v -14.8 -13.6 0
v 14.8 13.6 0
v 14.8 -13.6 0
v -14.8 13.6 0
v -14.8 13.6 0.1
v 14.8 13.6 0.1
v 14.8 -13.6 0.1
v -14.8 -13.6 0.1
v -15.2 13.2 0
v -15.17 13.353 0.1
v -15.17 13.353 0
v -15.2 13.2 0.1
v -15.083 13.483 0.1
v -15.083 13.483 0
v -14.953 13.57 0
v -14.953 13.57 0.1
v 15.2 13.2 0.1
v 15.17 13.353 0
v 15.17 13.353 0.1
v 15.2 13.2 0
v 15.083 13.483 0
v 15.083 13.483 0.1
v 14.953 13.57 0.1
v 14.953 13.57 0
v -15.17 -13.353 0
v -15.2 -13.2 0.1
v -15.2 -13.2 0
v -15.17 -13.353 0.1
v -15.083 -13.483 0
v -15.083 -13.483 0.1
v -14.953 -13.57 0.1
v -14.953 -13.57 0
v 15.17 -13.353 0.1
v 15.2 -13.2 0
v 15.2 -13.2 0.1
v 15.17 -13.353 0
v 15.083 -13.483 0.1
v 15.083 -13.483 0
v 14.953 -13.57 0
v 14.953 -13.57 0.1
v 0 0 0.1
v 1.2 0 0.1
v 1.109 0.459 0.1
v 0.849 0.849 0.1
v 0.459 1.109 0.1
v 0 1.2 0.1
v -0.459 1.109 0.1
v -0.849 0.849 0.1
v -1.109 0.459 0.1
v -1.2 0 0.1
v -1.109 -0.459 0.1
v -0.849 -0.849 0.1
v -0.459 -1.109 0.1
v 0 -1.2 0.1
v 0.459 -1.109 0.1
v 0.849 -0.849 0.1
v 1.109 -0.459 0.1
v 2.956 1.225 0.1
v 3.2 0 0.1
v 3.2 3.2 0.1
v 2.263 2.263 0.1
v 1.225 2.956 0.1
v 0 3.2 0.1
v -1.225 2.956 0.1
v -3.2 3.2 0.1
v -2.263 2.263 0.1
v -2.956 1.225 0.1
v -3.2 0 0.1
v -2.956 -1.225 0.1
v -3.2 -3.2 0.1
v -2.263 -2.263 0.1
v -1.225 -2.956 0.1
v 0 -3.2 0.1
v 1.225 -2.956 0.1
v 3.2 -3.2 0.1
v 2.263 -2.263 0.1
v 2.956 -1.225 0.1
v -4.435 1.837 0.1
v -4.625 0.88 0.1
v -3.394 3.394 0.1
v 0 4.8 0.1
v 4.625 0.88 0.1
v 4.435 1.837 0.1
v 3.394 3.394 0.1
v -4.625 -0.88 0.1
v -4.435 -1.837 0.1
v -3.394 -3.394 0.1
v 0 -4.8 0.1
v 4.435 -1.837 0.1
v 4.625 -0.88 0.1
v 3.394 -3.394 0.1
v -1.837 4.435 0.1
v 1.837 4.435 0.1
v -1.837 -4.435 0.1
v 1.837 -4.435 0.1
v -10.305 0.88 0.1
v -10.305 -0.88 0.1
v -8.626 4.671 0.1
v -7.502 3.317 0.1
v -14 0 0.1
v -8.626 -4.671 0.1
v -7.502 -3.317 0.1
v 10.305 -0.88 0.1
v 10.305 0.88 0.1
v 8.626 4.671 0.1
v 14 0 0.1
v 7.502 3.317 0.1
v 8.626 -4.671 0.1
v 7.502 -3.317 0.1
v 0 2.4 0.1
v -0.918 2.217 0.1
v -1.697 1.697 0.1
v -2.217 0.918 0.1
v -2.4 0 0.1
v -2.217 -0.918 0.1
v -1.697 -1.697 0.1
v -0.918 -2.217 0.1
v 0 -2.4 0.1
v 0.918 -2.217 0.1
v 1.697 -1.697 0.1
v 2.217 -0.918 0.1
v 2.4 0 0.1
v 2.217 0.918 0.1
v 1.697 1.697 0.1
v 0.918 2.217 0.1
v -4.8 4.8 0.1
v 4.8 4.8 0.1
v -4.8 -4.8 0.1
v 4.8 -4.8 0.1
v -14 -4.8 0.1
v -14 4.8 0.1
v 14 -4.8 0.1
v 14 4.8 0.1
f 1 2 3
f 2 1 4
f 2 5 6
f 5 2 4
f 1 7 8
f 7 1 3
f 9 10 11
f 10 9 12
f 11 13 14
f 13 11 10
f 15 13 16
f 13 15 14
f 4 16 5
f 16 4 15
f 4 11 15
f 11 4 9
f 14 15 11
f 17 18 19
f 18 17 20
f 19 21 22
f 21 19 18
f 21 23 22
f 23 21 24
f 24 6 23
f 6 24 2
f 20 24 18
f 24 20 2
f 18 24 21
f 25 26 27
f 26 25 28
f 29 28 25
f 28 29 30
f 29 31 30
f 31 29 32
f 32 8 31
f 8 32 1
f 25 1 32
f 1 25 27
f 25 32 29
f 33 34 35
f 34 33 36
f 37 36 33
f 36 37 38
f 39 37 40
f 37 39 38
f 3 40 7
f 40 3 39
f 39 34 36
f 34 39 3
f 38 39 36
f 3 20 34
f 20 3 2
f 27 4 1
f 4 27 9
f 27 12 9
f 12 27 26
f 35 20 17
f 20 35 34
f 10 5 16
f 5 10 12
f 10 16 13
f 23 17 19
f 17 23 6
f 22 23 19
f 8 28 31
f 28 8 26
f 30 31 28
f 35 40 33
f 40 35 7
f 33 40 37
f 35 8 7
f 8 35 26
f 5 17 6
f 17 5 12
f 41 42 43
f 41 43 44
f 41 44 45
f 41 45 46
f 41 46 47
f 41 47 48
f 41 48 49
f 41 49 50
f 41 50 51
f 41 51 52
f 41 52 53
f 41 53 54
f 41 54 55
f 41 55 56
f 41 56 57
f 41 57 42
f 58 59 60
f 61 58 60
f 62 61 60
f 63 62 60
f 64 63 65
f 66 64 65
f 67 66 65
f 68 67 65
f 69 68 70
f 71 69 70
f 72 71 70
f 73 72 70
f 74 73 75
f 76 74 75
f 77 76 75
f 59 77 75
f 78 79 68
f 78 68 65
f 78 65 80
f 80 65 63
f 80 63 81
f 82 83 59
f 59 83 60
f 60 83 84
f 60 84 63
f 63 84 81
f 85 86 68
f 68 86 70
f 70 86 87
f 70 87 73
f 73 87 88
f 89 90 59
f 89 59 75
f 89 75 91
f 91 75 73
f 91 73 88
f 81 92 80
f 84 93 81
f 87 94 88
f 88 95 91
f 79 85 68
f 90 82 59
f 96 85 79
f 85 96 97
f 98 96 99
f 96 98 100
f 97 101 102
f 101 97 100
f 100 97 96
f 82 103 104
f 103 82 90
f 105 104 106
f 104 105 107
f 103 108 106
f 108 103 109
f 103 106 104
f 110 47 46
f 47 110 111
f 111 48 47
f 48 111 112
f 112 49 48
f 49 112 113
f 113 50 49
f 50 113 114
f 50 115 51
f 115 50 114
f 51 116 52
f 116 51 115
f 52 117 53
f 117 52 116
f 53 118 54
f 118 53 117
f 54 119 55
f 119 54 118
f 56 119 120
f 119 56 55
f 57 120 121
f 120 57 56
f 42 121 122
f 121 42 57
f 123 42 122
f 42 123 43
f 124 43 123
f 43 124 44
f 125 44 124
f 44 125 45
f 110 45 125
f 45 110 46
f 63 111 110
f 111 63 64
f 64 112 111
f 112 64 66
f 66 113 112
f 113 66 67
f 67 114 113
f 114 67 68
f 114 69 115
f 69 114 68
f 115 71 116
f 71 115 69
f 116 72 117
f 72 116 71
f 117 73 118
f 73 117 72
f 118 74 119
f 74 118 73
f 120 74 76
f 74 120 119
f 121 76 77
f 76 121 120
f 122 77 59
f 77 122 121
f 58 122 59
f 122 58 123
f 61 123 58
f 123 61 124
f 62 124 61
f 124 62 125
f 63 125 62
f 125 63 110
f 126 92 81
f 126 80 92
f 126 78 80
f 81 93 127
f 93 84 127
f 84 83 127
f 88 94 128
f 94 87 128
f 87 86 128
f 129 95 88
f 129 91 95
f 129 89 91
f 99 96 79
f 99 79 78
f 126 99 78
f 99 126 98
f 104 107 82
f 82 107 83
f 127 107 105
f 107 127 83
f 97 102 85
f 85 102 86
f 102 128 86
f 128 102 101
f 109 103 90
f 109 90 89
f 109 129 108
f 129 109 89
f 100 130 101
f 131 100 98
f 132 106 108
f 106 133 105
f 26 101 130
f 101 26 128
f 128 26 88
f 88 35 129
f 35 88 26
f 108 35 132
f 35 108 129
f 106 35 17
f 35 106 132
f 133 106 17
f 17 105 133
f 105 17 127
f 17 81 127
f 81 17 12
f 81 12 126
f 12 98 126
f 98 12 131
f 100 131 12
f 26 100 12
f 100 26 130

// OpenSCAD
// file: ../p/empty.scad
use <../lib.scad>
function ldraw_lib__empty() = [
// 0 Empty
// 0 Name: empty.dat
// 0 Author: Steffen [Steffen]
// 0 !LDRAW_ORG Primitive UPDATE 2015-01
// 0 !LICENSE Licensed under CC BY 4.0 : see CAreadme.txt
// 
// 0 BFC CERTIFY CCW
  [0,"BFC","CERTIFY"],
  [0,"BFC","CCW"],
// 
// 0 !HISTORY 2015-10-11 [PTadmin] Official Update 2015-01
// 
// 
// 0 // Tool MLCad cannot handle really empty files. This file is used as a workaround.
// 0 // It exceptionally contains forbidden non-LDRAW standard syntax to satisfy MLCad until it is fixed OR a different editor has become the de-facto LDRAW standard.
// 0 // The line being used here is an "impossible" conditional line which never should be visible,
// 0 // additionally hidden by a syntax explicitly hiding it from displaying.
// 
// 0 MLCAD HIDE 5 24 0 0 0 0.0001 0 0 0.0001 -0.0001 0 0 0 0
];
module ldraw_lib__empty(step=0, col=false, unit=2/5, alt=false, line=0.2, solid=!$preview)
    makepoly(ldraw_lib__empty(), step=step, col=col, unit=unit, alt=alt, line=line, solid=solid);
ldraw_lib__empty(line=0.2);
// file: ../p/4-4ndis.scad
use <../lib.scad>
function ldraw_lib__4_4ndis() = [
// 0 Disc Negative 1.0
// 0 Name: 4-4ndis.dat
// 0 Author: James Jessiman
// 0 !LDRAW_ORG Primitive UPDATE 2012-01
// 0 !LICENSE Licensed under CC BY 4.0 : see CAreadme.txt
// 
// 0 BFC CERTIFY CCW
  [0,"BFC","CERTIFY"],
  [0,"BFC","CCW"],
// 
// 0 !HISTORY 2002-03-23 [sbliss] Added BFC statement; compacted code
// 0 !HISTORY 2002-04-25 [PTadmin] Official Update 2002-02
// 0 !HISTORY 2007-06-24 [PTadmin] Header formatted for Contributor Agreement
// 0 !HISTORY 2008-07-01 [PTadmin] Official Update 2008-01
// 0 !HISTORY 2012-02-16 [Philo] Changed to CCW
// 0 !HISTORY 2012-03-30 [PTadmin] Official Update 2012-01
// 
// 
// 3 16 0.9239 0 0.3827 1 0 0 1 0 1
  [3,16,0.9239,0,0.3827,1,0,0,1,0,1],
// 3 16 0.7071 0 0.7071 0.9239 0 0.3827 1 0 1
  [3,16,0.7071,0,0.7071,0.9239,0,0.3827,1,0,1],
// 3 16 0.3827 0 0.9239 0.7071 0 0.7071 1 0 1
  [3,16,0.3827,0,0.9239,0.7071,0,0.7071,1,0,1],
// 3 16 0 0 1 0.3827 0 0.9239 1 0 1
  [3,16,0,0,1,0.3827,0,0.9239,1,0,1],
// 3 16 -0.3827 0 0.9239 0 0 1 -1 0 1
  [3,16,-0.3827,0,0.9239,0,0,1,-1,0,1],
// 3 16 -0.7071 0 0.7071 -0.3827 0 0.9239 -1 0 1
  [3,16,-0.7071,0,0.7071,-0.3827,0,0.9239,-1,0,1],
// 3 16 -0.9239 0 0.3827 -0.7071 0 0.7071 -1 0 1
  [3,16,-0.9239,0,0.3827,-0.7071,0,0.7071,-1,0,1],
// 3 16 -1 0 0 -0.9239 0 0.3827 -1 0 1
  [3,16,-1,0,0,-0.9239,0,0.3827,-1,0,1],
// 3 16 -0.9239 0 -0.3827 -1 0 0 -1 0 -1
  [3,16,-0.9239,0,-0.3827,-1,0,0,-1,0,-1],
// 3 16 -0.7071 0 -0.7071 -0.9239 0 -0.3827 -1 0 -1
  [3,16,-0.7071,0,-0.7071,-0.9239,0,-0.3827,-1,0,-1],
// 3 16 -0.3827 0 -0.9239 -0.7071 0 -0.7071 -1 0 -1
  [3,16,-0.3827,0,-0.9239,-0.7071,0,-0.7071,-1,0,-1],
// 3 16 0 0 -1 -0.3827 0 -0.9239 -1 0 -1
  [3,16,0,0,-1,-0.3827,0,-0.9239,-1,0,-1],
// 3 16 0.3827 0 -0.9239 0 0 -1 1 0 -1
  [3,16,0.3827,0,-0.9239,0,0,-1,1,0,-1],
// 3 16 0.7071 0 -0.7071 0.3827 0 -0.9239 1 0 -1
  [3,16,0.7071,0,-0.7071,0.3827,0,-0.9239,1,0,-1],
// 3 16 0.9239 0 -0.3827 0.7071 0 -0.7071 1 0 -1
  [3,16,0.9239,0,-0.3827,0.7071,0,-0.7071,1,0,-1],
// 3 16 1 0 0 0.9239 0 -0.3827 1 0 -1
  [3,16,1,0,0,0.9239,0,-0.3827,1,0,-1],
];
module ldraw_lib__4_4ndis(step=0, col=false, unit=2/5, alt=false, line=0.2, solid=!$preview)
    makepoly(ldraw_lib__4_4ndis(), step=step, col=col, unit=unit, alt=alt, line=line, solid=solid);
ldraw_lib__4_4ndis(line=0.2);
// file: ../p/4-4disc.scad
use <../lib.scad>
function ldraw_lib__4_4disc() = [
// 0 Disc 1.0
// 0 Name: 4-4disc.dat
// 0 Author: James Jessiman
// 0 !LDRAW_ORG Primitive UPDATE 2002-02
// 0 !LICENSE Licensed under CC BY 4.0 : see CAreadme.txt
// 
// 0 BFC CERTIFY CCW
  [0,"BFC","CERTIFY"],
  [0,"BFC","CCW"],
// 
// 0 !HISTORY 1998-12-15 [PTadmin] Official Update 1998-10
// 0 !HISTORY 2002-03-23 [sbliss] Added BFC statement
// 0 !HISTORY 2002-04-25 [PTadmin] Official Update 2002-02
// 0 !HISTORY 2007-06-24 [PTadmin] Header formatted for Contributor Agreement
// 0 !HISTORY 2008-07-01 [PTadmin] Official Update 2008-01
// 
// 
// 3 16 0 0 0 1 0 0 0.9239 0 0.3827
  [3,16,0,0,0,1,0,0,0.9239,0,0.3827],
// 3 16 0 0 0 0.9239 0 0.3827 0.7071 0 0.7071
  [3,16,0,0,0,0.9239,0,0.3827,0.7071,0,0.7071],
// 3 16 0 0 0 0.7071 0 0.7071 0.3827 0 0.9239
  [3,16,0,0,0,0.7071,0,0.7071,0.3827,0,0.9239],
// 3 16 0 0 0 0.3827 0 0.9239 0 0 1
  [3,16,0,0,0,0.3827,0,0.9239,0,0,1],
// 3 16 0 0 0 0 0 1 -0.3827 0 0.9239
  [3,16,0,0,0,0,0,1,-0.3827,0,0.9239],
// 3 16 0 0 0 -0.3827 0 0.9239 -0.7071 0 0.7071
  [3,16,0,0,0,-0.3827,0,0.9239,-0.7071,0,0.7071],
// 3 16 0 0 0 -0.7071 0 0.7071 -0.9239 0 0.3827
  [3,16,0,0,0,-0.7071,0,0.7071,-0.9239,0,0.3827],
// 3 16 0 0 0 -0.9239 0 0.3827 -1 0 -0
  [3,16,0,0,0,-0.9239,0,0.3827,-1,0,-0],
// 3 16 0 0 0 -1 0 -0 -0.9239 0 -0.3827
  [3,16,0,0,0,-1,0,-0,-0.9239,0,-0.3827],
// 3 16 0 0 0 -0.9239 0 -0.3827 -0.7071 0 -0.7071
  [3,16,0,0,0,-0.9239,0,-0.3827,-0.7071,0,-0.7071],
// 3 16 0 0 0 -0.7071 0 -0.7071 -0.3827 0 -0.9239
  [3,16,0,0,0,-0.7071,0,-0.7071,-0.3827,0,-0.9239],
// 3 16 0 0 0 -0.3827 0 -0.9239 0 0 -1
  [3,16,0,0,0,-0.3827,0,-0.9239,0,0,-1],
// 3 16 0 0 0 0 0 -1 0.3827 0 -0.9239
  [3,16,0,0,0,0,0,-1,0.3827,0,-0.9239],
// 3 16 0 0 0 0.3827 0 -0.9239 0.7071 0 -0.7071
  [3,16,0,0,0,0.3827,0,-0.9239,0.7071,0,-0.7071],
// 3 16 0 0 0 0.7071 0 -0.7071 0.9239 0 -0.3827
  [3,16,0,0,0,0.7071,0,-0.7071,0.9239,0,-0.3827],
// 3 16 0 0 0 0.9239 0 -0.3827 1 0 0
  [3,16,0,0,0,0.9239,0,-0.3827,1,0,0],
// 0
];
module ldraw_lib__4_4disc(step=0, col=false, unit=2/5, alt=false, line=0.2, solid=!$preview)
    makepoly(ldraw_lib__4_4disc(), step=step, col=col, unit=unit, alt=alt, line=line, solid=solid);
ldraw_lib__4_4disc(line=0.2);
// file: ../p/1-8chrd.scad
use <../lib.scad>
function ldraw_lib__1_8chrd() = [
// 0 Chord 0.125
// 0 Name: 1-8chrd.dat
// 0 Author: Orion Pobursky [OrionP]
// 0 !LDRAW_ORG Primitive UPDATE 2023-05
// 0 !LICENSE Licensed under CC BY 4.0 : see CAreadme.txt
// 
// 0 BFC CERTIFY CCW
  [0,"BFC","CERTIFY"],
  [0,"BFC","CCW"],
// 
// 0 !HISTORY 2004-04-22 [PTadmin] Official Update 2004-02
// 0 !HISTORY 2007-06-22 [PTadmin] Header formatted for Contributor Agreement
// 0 !HISTORY 2008-07-01 [PTadmin] Official Update 2008-01
// 0 !HISTORY 2023-10-27 [OrionP] Rebuilt with PrimGen2, original author westrate
// 0 !HISTORY 2023-10-31 [OrionP] Official Update 2023-05
// 
// 3 16 1 0 0 0.9239 0 0.3827 0.7071 0 0.7071
  [3,16,1,0,0,0.9239,0,0.3827,0.7071,0,0.7071],
];
module ldraw_lib__1_8chrd(step=0, col=false, unit=2/5, alt=false, line=0.2, solid=!$preview)
    makepoly(ldraw_lib__1_8chrd(), step=step, col=col, unit=unit, alt=alt, line=line, solid=solid);
ldraw_lib__1_8chrd(line=0.2);
// file: ../p/1-16chrd.scad
use <../lib.scad>
use <empty.scad>
function ldraw_lib__1_16chrd() = [
// 0 Chord 0.0625
// 0 Name: 1-16chrd.dat
// 0 Author: Philippe Hurbain [Philo]
// 0 !LDRAW_ORG Primitive UPDATE 2015-01
// 0 !LICENSE Licensed under CC BY 4.0 : see CAreadme.txt
// 
// 0 BFC CERTIFY CCW
  [0,"BFC","CERTIFY"],
  [0,"BFC","CCW"],
// 
// 0 !HISTORY 2015-10-11 [PTadmin] Official Update 2015-01
// 
// 
// 0 // This file is intentionally empty because at the current \P resolution,
// 0 // an 1-16chrd is actually empty. However, this file still is present
// 0 // to allow tools to do primitives substition and fill in a real chrd here,
// 0 // or, if desired, to substitute this with the hi-res 48\1-16chrd.
// 
// 0 // This file is based on an idea by Darats at http://forums.ldraw.org/read.php?19,14500,14500#msg-14500
// 
// 1 16 0 0 0 1 0 0 0 1 0 0 0 1 empty.dat
  [1,16,0,0,0,1,0,0,0,1,0,0,0,1, ldraw_lib__empty()],
];
module ldraw_lib__1_16chrd(step=0, col=false, unit=2/5, alt=false, line=0.2, solid=!$preview)
    makepoly(ldraw_lib__1_16chrd(), step=step, col=col, unit=unit, alt=alt, line=line, solid=solid);
ldraw_lib__1_16chrd(line=0.2);
// file: ../p/4-4ring3.scad
use <../lib.scad>
function ldraw_lib__4_4ring3() = [
// 0 Ring  3 x 1.0
// 0 Name: 4-4ring3.dat
// 0 Author: James Jessiman
// 0 !LDRAW_ORG Primitive UPDATE 2009-01
// 0 !LICENSE Licensed under CC BY 4.0 : see CAreadme.txt
// 
// 0 BFC CERTIFY CCW
  [0,"BFC","CERTIFY"],
  [0,"BFC","CCW"],
// 
// 0 !HISTORY 1998-12-15 [PTadmin] Official Update 1998-10
// 0 !HISTORY 2002-04-05 [hafhead] Added BFC statement
// 0 !HISTORY 2002-04-25 [PTadmin] Official Update 2002-02
// 0 !HISTORY 2007-06-24 [PTadmin] Header formatted for Contributor Agreement
// 0 !HISTORY 2008-07-01 [PTadmin] Official Update 2008-01
// 0 !HISTORY 2008-08-26 [cwdee] Switch polygon winding and rename
// 0 !HISTORY 2009-05-02 [PTadmin] Official Update 2009-01
// 
// 
// 4 16 -1.5308 0 3.6956 -1.1481 0 2.7717 0 0 3 0 0 4
  [4,16,-1.5308,0,3.6956,-1.1481,0,2.7717,0,0,3,0,0,4],
// 4 16 -2.8284 0 2.8284 -2.1213 0 2.1213 -1.1481 0 2.7717 -1.5308 0 3.6956
  [4,16,-2.8284,0,2.8284,-2.1213,0,2.1213,-1.1481,0,2.7717,-1.5308,0,3.6956],
// 4 16 -3.6956 0 1.5308 -2.7717 0 1.1481 -2.1213 0 2.1213 -2.8284 0 2.8284
  [4,16,-3.6956,0,1.5308,-2.7717,0,1.1481,-2.1213,0,2.1213,-2.8284,0,2.8284],
// 4 16 -4 0 0 -3 0 0 -2.7717 0 1.1481 -3.6956 0 1.5308
  [4,16,-4,0,0,-3,0,0,-2.7717,0,1.1481,-3.6956,0,1.5308],
// 4 16 -3.6956 0 -1.5308 -2.7717 0 -1.1481 -3 0 0 -4 0 0
  [4,16,-3.6956,0,-1.5308,-2.7717,0,-1.1481,-3,0,0,-4,0,0],
// 4 16 -2.8284 0 -2.8284 -2.1213 0 -2.1213 -2.7717 0 -1.1481 -3.6956 0 -1.5308
  [4,16,-2.8284,0,-2.8284,-2.1213,0,-2.1213,-2.7717,0,-1.1481,-3.6956,0,-1.5308],
// 4 16 -1.5308 0 -3.6956 -1.1481 0 -2.7717 -2.1213 0 -2.1213 -2.8284 0 -2.8284
  [4,16,-1.5308,0,-3.6956,-1.1481,0,-2.7717,-2.1213,0,-2.1213,-2.8284,0,-2.8284],
// 4 16 0 0 -4 0 0 -3 -1.1481 0 -2.7717 -1.5308 0 -3.6956
  [4,16,0,0,-4,0,0,-3,-1.1481,0,-2.7717,-1.5308,0,-3.6956],
// 4 16 1.5308 0 -3.6956 1.1481 0 -2.7717 0 0 -3 0 0 -4
  [4,16,1.5308,0,-3.6956,1.1481,0,-2.7717,0,0,-3,0,0,-4],
// 4 16 2.8284 0 -2.8284 2.1213 0 -2.1213 1.1481 0 -2.7717 1.5308 0 -3.6956
  [4,16,2.8284,0,-2.8284,2.1213,0,-2.1213,1.1481,0,-2.7717,1.5308,0,-3.6956],
// 4 16 3.6956 0 -1.5308 2.7717 0 -1.1481 2.1213 0 -2.1213 2.8284 0 -2.8284
  [4,16,3.6956,0,-1.5308,2.7717,0,-1.1481,2.1213,0,-2.1213,2.8284,0,-2.8284],
// 4 16 4 0 0 3 0 0 2.7717 0 -1.1481 3.6956 0 -1.5308
  [4,16,4,0,0,3,0,0,2.7717,0,-1.1481,3.6956,0,-1.5308],
// 4 16 3.6956 0 1.5308 2.7717 0 1.1481 3 0 0 4 0 0
  [4,16,3.6956,0,1.5308,2.7717,0,1.1481,3,0,0,4,0,0],
// 4 16 2.8284 0 2.8284 2.1213 0 2.1213 2.7717 0 1.1481 3.6956 0 1.5308
  [4,16,2.8284,0,2.8284,2.1213,0,2.1213,2.7717,0,1.1481,3.6956,0,1.5308],
// 4 16 1.5308 0 3.6956 1.1481 0 2.7717 2.1213 0 2.1213 2.8284 0 2.8284
  [4,16,1.5308,0,3.6956,1.1481,0,2.7717,2.1213,0,2.1213,2.8284,0,2.8284],
// 4 16 0 0 4 0 0 3 1.1481 0 2.7717 1.5308 0 3.6956
  [4,16,0,0,4,0,0,3,1.1481,0,2.7717,1.5308,0,3.6956],
// 0
];
module ldraw_lib__4_4ring3(step=0, col=false, unit=2/5, alt=false, line=0.2, solid=!$preview)
    makepoly(ldraw_lib__4_4ring3(), step=step, col=col, unit=unit, alt=alt, line=line, solid=solid);
ldraw_lib__4_4ring3(line=0.2);
// file: ../p/4-4ring1.scad
use <../lib.scad>
function ldraw_lib__4_4ring1() = [
// 0 Ring  1 x 1.0
// 0 Name: 4-4ring1.dat
// 0 Author: James Jessiman
// 0 !LDRAW_ORG Primitive UPDATE 2009-01
// 0 !LICENSE Licensed under CC BY 4.0 : see CAreadme.txt
// 
// 0 BFC CERTIFY CCW
  [0,"BFC","CERTIFY"],
  [0,"BFC","CCW"],
// 
// 0 !HISTORY 1998-12-15 [PTadmin] Official Update 1998-10
// 0 !HISTORY 2002-04-08 [BrickCaster] Modified for BFC compliance
// 0 !HISTORY 2002-04-25 [PTadmin] Official Update 2002-02
// 0 !HISTORY 2007-06-24 [PTadmin] Header formatted for Contributor Agreement
// 0 !HISTORY 2008-07-01 [PTadmin] Official Update 2008-01
// 0 !HISTORY 2008-08-26 [cwdee] Switch polygon winding and rename
// 0 !HISTORY 2009-05-02 [PTadmin] Official Update 2009-01
// 
// 
// 4 16 -0.7654 0 1.8478 -0.3827 0 0.9239 0 0 1 0 0 2
  [4,16,-0.7654,0,1.8478,-0.3827,0,0.9239,0,0,1,0,0,2],
// 4 16 -1.4142 0 1.4142 -0.7071 0 0.7071 -0.3827 0 0.9239 -0.7654 0 1.8478
  [4,16,-1.4142,0,1.4142,-0.7071,0,0.7071,-0.3827,0,0.9239,-0.7654,0,1.8478],
// 4 16 -1.8478 0 0.7654 -0.9239 0 0.3827 -0.7071 0 0.7071 -1.4142 0 1.41420
  [4,16,-1.8478,0,0.7654,-0.9239,0,0.3827,-0.7071,0,0.7071,-1.4142,0,1.41420],
// 4 16 -2 0 0 -1 0 0 -0.9239 0 0.3827 -1.8478 0 0.7654
  [4,16,-2,0,0,-1,0,0,-0.9239,0,0.3827,-1.8478,0,0.7654],
// 4 16 -1.8478 0 -0.7654 -0.9239 0 -0.3827 -1 0 0 -2 0 0
  [4,16,-1.8478,0,-0.7654,-0.9239,0,-0.3827,-1,0,0,-2,0,0],
// 4 16 -1.4142 0 -1.4142 -0.7071 0 -0.7071 -0.9239 0 -0.3827 -1.8478 0 -0.7654
  [4,16,-1.4142,0,-1.4142,-0.7071,0,-0.7071,-0.9239,0,-0.3827,-1.8478,0,-0.7654],
// 4 16 -0.7654 0 -1.8478 -0.3827 0 -0.9239 -0.7071 0 -0.7071 -1.4142 0 -1.4142
  [4,16,-0.7654,0,-1.8478,-0.3827,0,-0.9239,-0.7071,0,-0.7071,-1.4142,0,-1.4142],
// 4 16 0 0 -2 0 0 -1 -0.3827 0 -0.9239 -0.7654 0 -1.8478
  [4,16,0,0,-2,0,0,-1,-0.3827,0,-0.9239,-0.7654,0,-1.8478],
// 4 16 0.7654 0 -1.8478 0.3827 0 -0.9239 0 0 -1 0 0 -2
  [4,16,0.7654,0,-1.8478,0.3827,0,-0.9239,0,0,-1,0,0,-2],
// 4 16 1.4142 0 -1.4142 0.7071 0 -0.7071 0.3827 0 -0.9239 0.7654 0 -1.8478
  [4,16,1.4142,0,-1.4142,0.7071,0,-0.7071,0.3827,0,-0.9239,0.7654,0,-1.8478],
// 4 16 1.8478 0 -0.7654 0.9239 0 -0.3827 0.7071 0 -0.7071 1.4142 0 -1.4142
  [4,16,1.8478,0,-0.7654,0.9239,0,-0.3827,0.7071,0,-0.7071,1.4142,0,-1.4142],
// 4 16 2 0 0 1 0 0 0.9239 0 -0.3827 1.8478 0 -0.7654
  [4,16,2,0,0,1,0,0,0.9239,0,-0.3827,1.8478,0,-0.7654],
// 4 16 1.8478 0 0.7654 0.9239 0 0.3827 1 0 0 2 0 0
  [4,16,1.8478,0,0.7654,0.9239,0,0.3827,1,0,0,2,0,0],
// 4 16 1.4142 0 1.4142 0.7071 0 0.7071 0.9239 0 0.3827 1.8478 0 0.7654
  [4,16,1.4142,0,1.4142,0.7071,0,0.7071,0.9239,0,0.3827,1.8478,0,0.7654],
// 4 16 0.7654 0 1.8478 0.3827 0 0.9239 0.7071 0 0.7071 1.4142 0 1.4142
  [4,16,0.7654,0,1.8478,0.3827,0,0.9239,0.7071,0,0.7071,1.4142,0,1.4142],
// 4 16 0 0 2 0 0 1 0.3827 0 0.9239 0.7654 0 1.8478
  [4,16,0,0,2,0,0,1,0.3827,0,0.9239,0.7654,0,1.8478],
// 0
];
module ldraw_lib__4_4ring1(step=0, col=false, unit=2/5, alt=false, line=0.2, solid=!$preview)
    makepoly(ldraw_lib__4_4ring1(), step=step, col=col, unit=unit, alt=alt, line=line, solid=solid);
ldraw_lib__4_4ring1(line=0.2);
// file: ../p/3-16ndis.scad
use <../lib.scad>
function ldraw_lib__3_16ndis() = [
// 0 Disc Negative 0.1875
// 0 Name: 3-16ndis.dat
// 0 Author: Guy Vivan [guyvivan]
// 0 !LDRAW_ORG Primitive UPDATE 2009-01
// 0 !LICENSE Licensed under CC BY 2.0 and CC BY 4.0 : see CAreadme.txt
// 
// 0 BFC CERTIFY CCW
  [0,"BFC","CERTIFY"],
  [0,"BFC","CCW"],
// 
// 0 !HISTORY 2009-05-02 [PTadmin] Official Update 2009-01
// 
// 
// 3 16 1 0 1 0.9239 0 0.3827 1 0 0
  [3,16,1,0,1,0.9239,0,0.3827,1,0,0],
// 3 16 1 0 1 0.7071 0 0.7071 0.9239 0 0.3827
  [3,16,1,0,1,0.7071,0,0.7071,0.9239,0,0.3827],
// 3 16 1 0 1 0.3827 0 0.9239 0.7071 0 0.7071
  [3,16,1,0,1,0.3827,0,0.9239,0.7071,0,0.7071],
// 
// 0 end of file
// 
];
module ldraw_lib__3_16ndis(step=0, col=false, unit=2/5, alt=false, line=0.2, solid=!$preview)
    makepoly(ldraw_lib__3_16ndis(), step=step, col=col, unit=unit, alt=alt, line=line, solid=solid);
ldraw_lib__3_16ndis(line=0.2);
// file: ../p/logo-train-2006.scad
use <../lib.scad>
use <1-16chrd.scad>
use <1-8chrd.scad>
use <4-4disc.scad>
use <4-4ndis.scad>
function ldraw_lib__logo_train_2006() = [
// 0 Logo Train 2006
// 0 Name: logo-train-2006.dat
// 0 Author: Gerald Lasser [GeraldLasser]
// 0 !LDRAW_ORG Primitive UPDATE 2023-07
// 0 !LICENSE Licensed under CC BY 4.0 : see CAreadme.txt
// 
// 0 BFC CERTIFY CCW
  [0,"BFC","CERTIFY"],
  [0,"BFC","CCW"],
// 
// 0 !HISTORY 2023-12-31 [OrionP] Official Update 2023-07
// 
// 
// 1 16 0 -.25 0 3 0 0 0 1 0 0 0 3 4-4disc.dat
  [1,16,0,-.25,0,3,0,0,0,1,0,0,0,3, ldraw_lib__4_4disc()],
// 1 16 0 -.25 0 8 0 0 0 1 0 0 0 8 4-4ndis.dat
  [1,16,0,-.25,0,8,0,0,0,1,0,0,0,8, ldraw_lib__4_4ndis()],
// 3 16 -11.0868 -.25 4.5924 -11.5625 -.25 2.2 -8 -.25 0
  [3,16,-11.0868,-.25,4.5924,-11.5625,-.25,2.2,-8,-.25,0],
// 3 16 -11.0868 -.25 4.5924 -8 -.25 0 -8 -.25 8
  [3,16,-11.0868,-.25,4.5924,-8,-.25,0,-8,-.25,8],
// 3 16 -11.0868 -.25 4.5924 -8 -.25 8 -8.4852 -.25 8.4852
  [3,16,-11.0868,-.25,4.5924,-8,-.25,8,-8.4852,-.25,8.4852],
// 3 16 -8.4852 -.25 8.4852 -8 -.25 8 0 -.25 8
  [3,16,-8.4852,-.25,8.4852,-8,-.25,8,0,-.25,8],
// 3 16 -8.4852 -.25 8.4852 0 -.25 8 0 -.25 12
  [3,16,-8.4852,-.25,8.4852,0,-.25,8,0,-.25,12],
// 3 16 11.5625 -.25 2.2 11.0868 -.25 4.5924 8 -.25 0
  [3,16,11.5625,-.25,2.2,11.0868,-.25,4.5924,8,-.25,0],
// 3 16 8 -.25 0 11.0868 -.25 4.5924 8 -.25 8
  [3,16,8,-.25,0,11.0868,-.25,4.5924,8,-.25,8],
// 3 16 8 -.25 8 11.0868 -.25 4.5924 8.4852 -.25 8.4852
  [3,16,8,-.25,8,11.0868,-.25,4.5924,8.4852,-.25,8.4852],
// 3 16 8 -.25 8 8.4852 -.25 8.4852 0 -.25 8
  [3,16,8,-.25,8,8.4852,-.25,8.4852,0,-.25,8],
// 3 16 0 -.25 8 8.4852 -.25 8.4852 0 -.25 12
  [3,16,0,-.25,8,8.4852,-.25,8.4852,0,-.25,12],
// 
// 3 16 -11.5625 -.25 -2.2 -11.0868 -.25 -4.5924 -8 -.25 0
  [3,16,-11.5625,-.25,-2.2,-11.0868,-.25,-4.5924,-8,-.25,0],
// 3 16 -8 -.25 0 -11.0868 -.25 -4.5924 -8 -.25 -8
  [3,16,-8,-.25,0,-11.0868,-.25,-4.5924,-8,-.25,-8],
// 3 16 -8 -.25 -8 -11.0868 -.25 -4.5924 -8.4852 -.25 -8.4852
  [3,16,-8,-.25,-8,-11.0868,-.25,-4.5924,-8.4852,-.25,-8.4852],
// 3 16 -8 -.25 -8 -8.4852 -.25 -8.4852 0 -.25 -8
  [3,16,-8,-.25,-8,-8.4852,-.25,-8.4852,0,-.25,-8],
// 3 16 0 -.25 -8 -8.4852 -.25 -8.4852 0 -.25 -12
  [3,16,0,-.25,-8,-8.4852,-.25,-8.4852,0,-.25,-12],
// 3 16 11.0868 -.25 -4.5924 11.5625 -.25 -2.2 8 -.25 0
  [3,16,11.0868,-.25,-4.5924,11.5625,-.25,-2.2,8,-.25,0],
// 3 16 11.0868 -.25 -4.5924 8 -.25 0 8 -.25 -8
  [3,16,11.0868,-.25,-4.5924,8,-.25,0,8,-.25,-8],
// 3 16 11.0868 -.25 -4.5924 8 -.25 -8 8.4852 -.25 -8.4852
  [3,16,11.0868,-.25,-4.5924,8,-.25,-8,8.4852,-.25,-8.4852],
// 3 16 8.4852 -.25 -8.4852 8 -.25 -8 0 -.25 -8
  [3,16,8.4852,-.25,-8.4852,8,-.25,-8,0,-.25,-8],
// 3 16 8.4852 -.25 -8.4852 0 -.25 -8 0 -.25 -12
  [3,16,8.4852,-.25,-8.4852,0,-.25,-8,0,-.25,-12],
// 
// 1 16 0 -.25 0 0 0 -12 0 1 0 12 0 0 1-8chrd.dat
  [1,16,0,-.25,0,0,0,-12,0,1,0,12,0,0, ldraw_lib__1_8chrd()],
// 1 16 0 -.25 0 0 0 12 0 1 0 12 0 0 1-8chrd.dat
  [1,16,0,-.25,0,0,0,12,0,1,0,12,0,0, ldraw_lib__1_8chrd()],
// 1 16 0 -.25 0 -8.48528 0 -8.48528 0 1 0 8.48528 0 -8.48528 1-16chrd.dat
  [1,16,0,-.25,0,-8.48528,0,-8.48528,0,1,0,8.48528,0,-8.48528, ldraw_lib__1_16chrd()],
// 1 16 0 -.25 0 8.48528 0 8.48528 0 1 0 8.48528 0 -8.48528 1-16chrd.dat
  [1,16,0,-.25,0,8.48528,0,8.48528,0,1,0,8.48528,0,-8.48528, ldraw_lib__1_16chrd()],
// 1 16 0 -.25 0 0 0 -12 0 1 0 -12 0 0 1-8chrd.dat
  [1,16,0,-.25,0,0,0,-12,0,1,0,-12,0,0, ldraw_lib__1_8chrd()],
// 1 16 0 -.25 0 0 0 12 0 1 0 -12 0 0 1-8chrd.dat
  [1,16,0,-.25,0,0,0,12,0,1,0,-12,0,0, ldraw_lib__1_8chrd()],
// 1 16 0 -.25 0 -8.48528 0 -8.48528 0 1 0 -8.48528 0 8.48528 1-16chrd.dat
  [1,16,0,-.25,0,-8.48528,0,-8.48528,0,1,0,-8.48528,0,8.48528, ldraw_lib__1_16chrd()],
// 1 16 0 -.25 0 8.48528 0 8.48528 0 1 0 -8.48528 0 8.48528 1-16chrd.dat
  [1,16,0,-.25,0,8.48528,0,8.48528,0,1,0,-8.48528,0,8.48528, ldraw_lib__1_16chrd()],
// 
// 3 16 -11.5625 -.25 2.2 -11.5625 -.25 -2.2 -8 -.25 0
  [3,16,-11.5625,-.25,2.2,-11.5625,-.25,-2.2,-8,-.25,0],
// 3 16 11.5625 -.25 -2.2 11.5625 -.25 2.2 8 -.25 0
  [3,16,11.5625,-.25,-2.2,11.5625,-.25,2.2,8,-.25,0],
// 4 16 -25.7625 -.25 2.2 -25.7625 -.25 -2.2 -11.5625 -.25 -2.2 -11.5625 -.25 2.2
  [4,16,-25.7625,-.25,2.2,-25.7625,-.25,-2.2,-11.5625,-.25,-2.2,-11.5625,-.25,2.2],
// 4 16 -35 -.25 0 -25.7625 -.25 2.2 -18.755 -.25 8.2915 -21.5662 -.25 11.6778
  [4,16,-35,-.25,0,-25.7625,-.25,2.2,-18.755,-.25,8.2915,-21.5662,-.25,11.6778],
// 4 16 -18.755 -.25 -8.2915 -25.7625 -.25 -2.2 -35 -.25 0 -21.5662 -.25 -11.6778
  [4,16,-18.755,-.25,-8.2915,-25.7625,-.25,-2.2,-35,-.25,0,-21.5662,-.25,-11.6778],
// 3 16 -35 -.25 0 -25.7625 -.25 -2.2 -25.7625 -.25 2.2
  [3,16,-35,-.25,0,-25.7625,-.25,-2.2,-25.7625,-.25,2.2],
// 4 16 11.5625 -.25 -2.2 25.7625 -.25 -2.2 25.7625 -.25 2.2 11.5625 -.25 2.2
  [4,16,11.5625,-.25,-2.2,25.7625,-.25,-2.2,25.7625,-.25,2.2,11.5625,-.25,2.2],
// 4 16 18.755 -.25 8.2915 25.7625 -.25 2.2 35 -.25 0 21.5662 -.25 11.6778
  [4,16,18.755,-.25,8.2915,25.7625,-.25,2.2,35,-.25,0,21.5662,-.25,11.6778],
// 4 16 35 -.25 0 25.7625 -.25 -2.2 18.755 -.25 -8.2915 21.5662 -.25 -11.6778
  [4,16,35,-.25,0,25.7625,-.25,-2.2,18.755,-.25,-8.2915,21.5662,-.25,-11.6778],
// 3 16 25.7625 -.25 -2.2 35 -.25 0 25.7625 -.25 2.2
  [3,16,25.7625,-.25,-2.2,35,-.25,0,25.7625,-.25,2.2],
];
module ldraw_lib__logo_train_2006(step=0, col=false, unit=2/5, alt=false, line=0.2, solid=!$preview)
    makepoly(ldraw_lib__logo_train_2006(), step=step, col=col, unit=unit, alt=alt, line=line, solid=solid);
ldraw_lib__logo_train_2006(line=0.2);
// file: ../p/logo-train-2006-box.scad
use <../lib.scad>
use <3-16ndis.scad>
use <4-4ring1.scad>
use <4-4ring3.scad>
function ldraw_lib__logo_train_2006_box() = [
// 0 Logo Train 2006 Outer Box
// 0 Name: logo-train-2006-box.dat
// 0 Author: Gerald Lasser [GeraldLasser]
// 0 !LDRAW_ORG Primitive UPDATE 2023-07
// 0 !LICENSE Licensed under CC BY 4.0 : see CAreadme.txt
// 
// 0 BFC CERTIFY CCW
  [0,"BFC","CERTIFY"],
  [0,"BFC","CCW"],
// 
// 0 !HISTORY 2023-12-31 [OrionP] Official Update 2023-07
// 
// 
// 1 16 0 -.25 0 3 0 0 0 1 0 0 0 3 4-4ring1.dat
  [1,16,0,-.25,0,3,0,0,0,1,0,0,0,3, ldraw_lib__4_4ring1()],
// 1 16 0 -.25 0 2 0 0 0 1 0 0 0 2 4-4ring3.dat
  [1,16,0,-.25,0,2,0,0,0,1,0,0,0,2, ldraw_lib__4_4ring3()],
// 1 16 0 -.25 0 0 0 -12 0 1 0 12 0 0 3-16ndis.dat
  [1,16,0,-.25,0,0,0,-12,0,1,0,12,0,0, ldraw_lib__3_16ndis()],
// 1 16 0 -.25 0 0 0 12 0 1 0 12 0 0 3-16ndis.dat
  [1,16,0,-.25,0,0,0,12,0,1,0,12,0,0, ldraw_lib__3_16ndis()],
// 1 16 0 -.25 0 0 0 -12 0 1 0 -12 0 0 3-16ndis.dat
  [1,16,0,-.25,0,0,0,-12,0,1,0,-12,0,0, ldraw_lib__3_16ndis()],
// 1 16 0 -.25 0 0 0 12 0 1 0 -12 0 0 3-16ndis.dat
  [1,16,0,-.25,0,0,0,12,0,1,0,-12,0,0, ldraw_lib__3_16ndis()],
// 
// 3 16 -18.755 -.25 8.2915 -25.7625 -.25 2.2 -11.5625 -.25 2.2
  [3,16,-18.755,-.25,8.2915,-25.7625,-.25,2.2,-11.5625,-.25,2.2],
// 3 16 -18.755 -.25 8.2915 -11.5625 -.25 2.2 -11.0868 -.25 4.5924
  [3,16,-18.755,-.25,8.2915,-11.5625,-.25,2.2,-11.0868,-.25,4.5924],
// 4 16 -12 -.25 12 -21.5662 -.25 11.6778 -18.755 -.25 8.2915 -11.0868 -.25 4.5924
  [4,16,-12,-.25,12,-21.5662,-.25,11.6778,-18.755,-.25,8.2915,-11.0868,-.25,4.5924],
// 3 16 25.7625 -.25 2.2 18.755 -.25 8.2915 11.5625 -.25 2.2
  [3,16,25.7625,-.25,2.2,18.755,-.25,8.2915,11.5625,-.25,2.2],
// 3 16 11.5625 -.25 2.2 18.755 -.25 8.2915 11.0868 -.25 4.5924
  [3,16,11.5625,-.25,2.2,18.755,-.25,8.2915,11.0868,-.25,4.5924],
// 4 16 18.755 -.25 8.2915 21.5662 -.25 11.6778 12 -.25 12 11.0868 -.25 4.5924
  [4,16,18.755,-.25,8.2915,21.5662,-.25,11.6778,12,-.25,12,11.0868,-.25,4.5924],
// 3 16 -25.7625 -.25 -2.2 -18.755 -.25 -8.2915 -11.5625 -.25 -2.2
  [3,16,-25.7625,-.25,-2.2,-18.755,-.25,-8.2915,-11.5625,-.25,-2.2],
// 3 16 -11.5625 -.25 -2.2 -18.755 -.25 -8.2915 -11.0868 -.25 -4.5924
  [3,16,-11.5625,-.25,-2.2,-18.755,-.25,-8.2915,-11.0868,-.25,-4.5924],
// 4 16 -18.755 -.25 -8.2915 -21.5662 -.25 -11.6778 -12 -.25 -12 -11.0868 -.25 -4.5924
  [4,16,-18.755,-.25,-8.2915,-21.5662,-.25,-11.6778,-12,-.25,-12,-11.0868,-.25,-4.5924],
// 3 16 18.755 -.25 -8.2915 25.7625 -.25 -2.2 11.5625 -.25 -2.2
  [3,16,18.755,-.25,-8.2915,25.7625,-.25,-2.2,11.5625,-.25,-2.2],
// 3 16 18.755 -.25 -8.2915 11.5625 -.25 -2.2 11.0868 -.25 -4.5924
  [3,16,18.755,-.25,-8.2915,11.5625,-.25,-2.2,11.0868,-.25,-4.5924],
// 4 16 12 -.25 -12 21.5662 -.25 -11.6778 18.755 -.25 -8.2915 11.0868 -.25 -4.5924
  [4,16,12,-.25,-12,21.5662,-.25,-11.6778,18.755,-.25,-8.2915,11.0868,-.25,-4.5924],
// 
// 3 16 -35 -.25 0 -35 -.25 -12 -21.5662 -.25 -11.6778
  [3,16,-35,-.25,0,-35,-.25,-12,-21.5662,-.25,-11.6778],
// 3 16 -35 -.25 12 -35 -.25 0 -21.5662 -.25 11.6778
  [3,16,-35,-.25,12,-35,-.25,0,-21.5662,-.25,11.6778],
// 3 16 35 -.25 -12 35 -.25 0 21.5662 -.25 -11.6778
  [3,16,35,-.25,-12,35,-.25,0,21.5662,-.25,-11.6778],
// 3 16 35 -.25 0 35 -.25 12 21.5662 -.25 11.6778
  [3,16,35,-.25,0,35,-.25,12,21.5662,-.25,11.6778],
];
module ldraw_lib__logo_train_2006_box(step=0, col=false, unit=2/5, alt=false, line=0.2, solid=!$preview)
    makepoly(ldraw_lib__logo_train_2006_box(), step=step, col=col, unit=unit, alt=alt, line=line, solid=solid);
ldraw_lib__logo_train_2006_box(line=0.2);
// file: ../p/box3u12.scad
use <../lib.scad>
function ldraw_lib__box3u12() = [
// 0 Box with 3 Parallel Faces without Any Edges
// 0 Name: box3u12.dat
// 0 Author: J.C. Tchang [tchang]
// 0 !LDRAW_ORG Primitive UPDATE 2014-02
// 0 !LICENSE Licensed under CC BY 4.0 : see CAreadme.txt
// 
// 0 BFC CERTIFY CCW
  [0,"BFC","CERTIFY"],
  [0,"BFC","CCW"],
// 
// 0 !HISTORY 2014-12-23 [PTadmin] Official Update 2014-02
// 
// 
// 4 16 -1 1 1 1 1 1 1 1 -1 -1 1 -1
  [4,16,-1,1,1,1,1,1,1,1,-1,-1,1,-1],
// 4 16 -1 1 1 -1 0 1 1 0 1 1 1 1
  [4,16,-1,1,1,-1,0,1,1,0,1,1,1,1],
// 4 16 1 1 -1 1 0 -1 -1 0 -1 -1 1 -1
  [4,16,1,1,-1,1,0,-1,-1,0,-1,-1,1,-1],
];
module ldraw_lib__box3u12(step=0, col=false, unit=2/5, alt=false, line=0.2, solid=!$preview)
    makepoly(ldraw_lib__box3u12(), step=step, col=col, unit=unit, alt=alt, line=line, solid=solid);
ldraw_lib__box3u12(line=0.2);
// file: ../p/1-4cyli.scad
use <../lib.scad>
function ldraw_lib__1_4cyli() = [
// 0 Cylinder 0.25
// 0 Name: 1-4cyli.dat
// 0 Author: James Jessiman
// 0 !LDRAW_ORG Primitive UPDATE 2012-01
// 0 !LICENSE Licensed under CC BY 4.0 : see CAreadme.txt
// 
// 0 BFC CERTIFY CCW
  [0,"BFC","CERTIFY"],
  [0,"BFC","CCW"],
// 
// 0 !HISTORY 2002-03-23 [sbliss] Added BFC statement.
// 0 !HISTORY 2002-04-25 [PTadmin] Official Update 2002-02
// 0 !HISTORY 2007-06-22 [PTadmin] Header formatted for Contributor Agreement
// 0 !HISTORY 2008-07-01 [PTadmin] Official Update 2008-01
// 0 !HISTORY 2012-02-16 [Philo] Changed to CCW
// 0 !HISTORY 2012-03-30 [PTadmin] Official Update 2012-01
// 
// 
// 4 16 1 1 0 0.9239 1 0.3827 0.9239 0 0.3827 1 0 0
  [4,16,1,1,0,0.9239,1,0.3827,0.9239,0,0.3827,1,0,0],
// 5 24 1 0 0 1 1 0 0.9239 0 0.3827 1 0 -1
  [5,24,1,0,0,1,1,0,0.9239,0,0.3827,1,0,-1],
// 4 16 0.9239 1 0.3827 0.7071 1 0.7071 0.7071 0 0.7071 0.9239 0 0.3827
  [4,16,0.9239,1,0.3827,0.7071,1,0.7071,0.7071,0,0.7071,0.9239,0,0.3827],
// 5 24 0.9239 0 0.3827 0.9239 1 0.3827 0.7071 0 0.7071 1 0 0
  [5,24,0.9239,0,0.3827,0.9239,1,0.3827,0.7071,0,0.7071,1,0,0],
// 4 16 0.7071 1 0.7071 0.3827 1 0.9239 0.3827 0 0.9239 0.7071 0 0.7071
  [4,16,0.7071,1,0.7071,0.3827,1,0.9239,0.3827,0,0.9239,0.7071,0,0.7071],
// 5 24 0.7071 0 0.7071 0.7071 1 0.7071 0.3827 0 0.9239 0.9239 0 0.3827
  [5,24,0.7071,0,0.7071,0.7071,1,0.7071,0.3827,0,0.9239,0.9239,0,0.3827],
// 4 16 0.3827 1 0.9239 0 1 1 0 0 1 0.3827 0 0.9239
  [4,16,0.3827,1,0.9239,0,1,1,0,0,1,0.3827,0,0.9239],
// 5 24 0.3827 0 0.9239 0.3827 1 0.9239 0 0 1 0.7071 0 0.7071
  [5,24,0.3827,0,0.9239,0.3827,1,0.9239,0,0,1,0.7071,0,0.7071],
// 5 24 0 0 1 0 1 1 0.3827 0 0.9239 -1 0 1
  [5,24,0,0,1,0,1,1,0.3827,0,0.9239,-1,0,1],
];
module ldraw_lib__1_4cyli(step=0, col=false, unit=2/5, alt=false, line=0.2, solid=!$preview)
    makepoly(ldraw_lib__1_4cyli(), step=step, col=col, unit=unit, alt=alt, line=line, solid=solid);
ldraw_lib__1_4cyli(line=0.2);
// file: ../p/1-4chrd.scad
use <../lib.scad>
function ldraw_lib__1_4chrd() = [
// 0 Chord 0.25
// 0 Name: 1-4chrd.dat
// 0 Author: Max Martin Richter [MMR1988]
// 0 !LDRAW_ORG Primitive UPDATE 2023-05
// 0 !LICENSE Licensed under CC BY 4.0 : see CAreadme.txt
// 
// 0 BFC CERTIFY CCW
  [0,"BFC","CERTIFY"],
  [0,"BFC","CCW"],
// 
// 0 !HISTORY 2004-04-22 [PTadmin] Official Update 2004-02
// 0 !HISTORY 2007-10-09 [PTadmin] Header formatted for Contributor Agreement
// 0 !HISTORY 2008-07-01 [PTadmin] Official Update 2008-01
// 0 !HISTORY 2012-08-02 [MMR1988] Re-creation with PrimGen2 and Rectifier
// 0 !HISTORY 2012-08-09 [PTadmin] Official Update 2012-02
// 0 !HISTORY 2023-10-27 [OrionP] Change author to MMR1988 from hafhead
// 0 !HISTORY 2023-10-31 [OrionP] Official Update 2023-05
// 
// 4 16 0.9239 0 0.3827 0.3827 0 0.9239 0 0 1 1 0 0
  [4,16,0.9239,0,0.3827,0.3827,0,0.9239,0,0,1,1,0,0],
// 3 16 0.7071 0 0.7071 0.3827 0 0.9239 0.9239 0 0.3827
  [3,16,0.7071,0,0.7071,0.3827,0,0.9239,0.9239,0,0.3827],
];
module ldraw_lib__1_4chrd(step=0, col=false, unit=2/5, alt=false, line=0.2, solid=!$preview)
    makepoly(ldraw_lib__1_4chrd(), step=step, col=col, unit=unit, alt=alt, line=line, solid=solid);
ldraw_lib__1_4chrd(line=0.2);
// main file
use <../lib.scad>
use <../p/1-4chrd.scad>
use <../p/1-4cyli.scad>
use <../p/box3u12.scad>
use <../p/logo-train-2006-box.scad>
use <../p/logo-train-2006.scad>
function ldraw_lib__6316625e() = [
// 0 Sticker  3.4 x  3.8  with Dark Azur Train Logo (2006) on White Background
// 0 Name: 6316625e.dat
// 0 Author: Gerald Lasser [GeraldLasser]
// 0 !LDRAW_ORG Part UPDATE 2023-07
// 0 !LICENSE Licensed under CC BY 4.0 : see CAreadme.txt
// 
// 0 BFC CERTIFY CCW
  [0,"BFC","CERTIFY"],
  [0,"BFC","CCW"],
// 
// 0 !KEYWORDS Set 60336
// 
// 0 !HISTORY 2023-12-31 [OrionP] Official Update 2023-07
// 
// 
// 0 // Box
// 1 16 0 -.25 0 37 0 0 0 .25 0 0 0 34 box3u12.dat
  [1,16,0,-.25,0,37,0,0,0,.25,0,0,0,34, ldraw_lib__box3u12()],
// 
// 1 16 -37 -.25 33 -1 0 0 0 .25 0 0 0 1 1-4cyli.dat
  [1,16,-37,-.25,33,-1,0,0,0,.25,0,0,0,1, ldraw_lib__1_4cyli()],
// 1 16 -37 0 33 -1 0 0 0 -1 0 0 0 1 1-4chrd.dat
  [1,16,-37,0,33,-1,0,0,0,-1,0,0,0,1, ldraw_lib__1_4chrd()],
// 1 16 37 -.25 33 1 0 0 0 .25 0 0 0 1 1-4cyli.dat
  [1,16,37,-.25,33,1,0,0,0,.25,0,0,0,1, ldraw_lib__1_4cyli()],
// 1 16 37 0 33 1 0 0 0 -1 0 0 0 1 1-4chrd.dat
  [1,16,37,0,33,1,0,0,0,-1,0,0,0,1, ldraw_lib__1_4chrd()],
// 1 16 -37 -.25 -33 -1 0 0 0 .25 0 0 0 -1 1-4cyli.dat
  [1,16,-37,-.25,-33,-1,0,0,0,.25,0,0,0,-1, ldraw_lib__1_4cyli()],
// 1 16 -37 0 -33 -1 0 0 0 -1 0 0 0 -1 1-4chrd.dat
  [1,16,-37,0,-33,-1,0,0,0,-1,0,0,0,-1, ldraw_lib__1_4chrd()],
// 1 16 37 -.25 -33 1 0 0 0 .25 0 0 0 -1 1-4cyli.dat
  [1,16,37,-.25,-33,1,0,0,0,.25,0,0,0,-1, ldraw_lib__1_4cyli()],
// 1 16 37 0 -33 1 0 0 0 -1 0 0 0 -1 1-4chrd.dat
  [1,16,37,0,-33,1,0,0,0,-1,0,0,0,-1, ldraw_lib__1_4chrd()],
// 4 16 38 0 -33 37 0 -34 37 0 34 38 0 33
  [4,16,38,0,-33,37,0,-34,37,0,34,38,0,33],
// 4 16 -38 0 -33 -38 0 33 -37 0 34 -37 0 -34
  [4,16,-38,0,-33,-38,0,33,-37,0,34,-37,0,-34],
// 4 16 -38 0 -33 -38 -.25 -33 -38 -.25 33 -38 0 33
  [4,16,-38,0,-33,-38,-.25,-33,-38,-.25,33,-38,0,33],
// 4 16 38 0 33 38 -.25 33 38 -.25 -33 38 0 -33
  [4,16,38,0,33,38,-.25,33,38,-.25,-33,38,0,-33],
// 
// 0 // Pattern
// 1 15 -37 -.25 33 -1 0 0 0 1 0 0 0 1 1-4chrd.dat
  [1,15,-37,-.25,33,-1,0,0,0,1,0,0,0,1, ldraw_lib__1_4chrd()],
// 1 15 37 -.25 33 1 0 0 0 1 0 0 0 1 1-4chrd.dat
  [1,15,37,-.25,33,1,0,0,0,1,0,0,0,1, ldraw_lib__1_4chrd()],
// 1 15 -37 -.25 -33 -1 0 0 0 1 0 0 0 -1 1-4chrd.dat
  [1,15,-37,-.25,-33,-1,0,0,0,1,0,0,0,-1, ldraw_lib__1_4chrd()],
// 1 15 37 -.25 -33 1 0 0 0 1 0 0 0 -1 1-4chrd.dat
  [1,15,37,-.25,-33,1,0,0,0,1,0,0,0,-1, ldraw_lib__1_4chrd()],
// 4 15 -38 -.25 -33 -37 -.25 -34 37 -.25 -34 38 -.25 -33
  [4,15,-38,-.25,-33,-37,-.25,-34,37,-.25,-34,38,-.25,-33],
// 4 15 38 -.25 33 37 -.25 34 -37 -.25 34 -38 -.25 33
  [4,15,38,-.25,33,37,-.25,34,-37,-.25,34,-38,-.25,33],
// 
// 1 321 0 0 0 1 0 0 0 1 0 0 0 1 logo-train-2006.dat
  [1,321,0,0,0,1,0,0,0,1,0,0,0,1, ldraw_lib__logo_train_2006()],
// 1 15 0 0 0 1 0 0 0 1 0 0 0 1 logo-train-2006-box.dat
  [1,15,0,0,0,1,0,0,0,1,0,0,0,1, ldraw_lib__logo_train_2006_box()],
// 
// 4 15 -35 -.25 -12 -38 -.25 -33 -12 -.25 -12 -21.5662 -.25 -11.6778
  [4,15,-35,-.25,-12,-38,-.25,-33,-12,-.25,-12,-21.5662,-.25,-11.6778],
// 3 15 -12 -.25 -12 -38 -.25 -33 0 -.25 -12
  [3,15,-12,-.25,-12,-38,-.25,-33,0,-.25,-12],
// 4 15 0 -.25 -12 -38 -.25 -33 38 -.25 -33 12 -.25 -12
  [4,15,0,-.25,-12,-38,-.25,-33,38,-.25,-33,12,-.25,-12],
// 4 15 12 -.25 -12 38 -.25 -33 35 -.25 -12 21.5662 -.25 -11.6778
  [4,15,12,-.25,-12,38,-.25,-33,35,-.25,-12,21.5662,-.25,-11.6778],
// 4 15 38 -.25 33 35 -.25 0 35 -.25 -12 38 -.25 -33
  [4,15,38,-.25,33,35,-.25,0,35,-.25,-12,38,-.25,-33],
// 3 15 35 -.25 12 35 -.25 0 38 -.25 33
  [3,15,35,-.25,12,35,-.25,0,38,-.25,33],
// 4 15 35 -.25 12 38 -.25 33 12 -.25 12 21.5662 -.25 11.6778
  [4,15,35,-.25,12,38,-.25,33,12,-.25,12,21.5662,-.25,11.6778],
// 4 15 -38 -.25 33 0 -.25 12 12 -.25 12 38 -.25 33
  [4,15,-38,-.25,33,0,-.25,12,12,-.25,12,38,-.25,33],
// 3 15 0 -.25 12 -38 -.25 33 -12 -.25 12
  [3,15,0,-.25,12,-38,-.25,33,-12,-.25,12],
// 4 15 -35 -.25 12 -21.5662 -.25 11.6778 -12 -.25 12 -38 -.25 33
  [4,15,-35,-.25,12,-21.5662,-.25,11.6778,-12,-.25,12,-38,-.25,33],
// 3 15 -35 -.25 0 -35 -.25 12 -38 -.25 33
  [3,15,-35,-.25,0,-35,-.25,12,-38,-.25,33],
// 4 15 -35 -.25 -12 -35 -.25 0 -38 -.25 33 -38 -.25 -33
  [4,15,-35,-.25,-12,-35,-.25,0,-38,-.25,33,-38,-.25,-33],
];
module ldraw_lib__6316625e(step=0, col=false, unit=2/5, alt=false, line=0.2, solid=!$preview)
    makepoly(ldraw_lib__6316625e(), step=step, col=col, unit=unit, alt=alt, line=line, solid=solid);
ldraw_lib__6316625e(line=0.2);
